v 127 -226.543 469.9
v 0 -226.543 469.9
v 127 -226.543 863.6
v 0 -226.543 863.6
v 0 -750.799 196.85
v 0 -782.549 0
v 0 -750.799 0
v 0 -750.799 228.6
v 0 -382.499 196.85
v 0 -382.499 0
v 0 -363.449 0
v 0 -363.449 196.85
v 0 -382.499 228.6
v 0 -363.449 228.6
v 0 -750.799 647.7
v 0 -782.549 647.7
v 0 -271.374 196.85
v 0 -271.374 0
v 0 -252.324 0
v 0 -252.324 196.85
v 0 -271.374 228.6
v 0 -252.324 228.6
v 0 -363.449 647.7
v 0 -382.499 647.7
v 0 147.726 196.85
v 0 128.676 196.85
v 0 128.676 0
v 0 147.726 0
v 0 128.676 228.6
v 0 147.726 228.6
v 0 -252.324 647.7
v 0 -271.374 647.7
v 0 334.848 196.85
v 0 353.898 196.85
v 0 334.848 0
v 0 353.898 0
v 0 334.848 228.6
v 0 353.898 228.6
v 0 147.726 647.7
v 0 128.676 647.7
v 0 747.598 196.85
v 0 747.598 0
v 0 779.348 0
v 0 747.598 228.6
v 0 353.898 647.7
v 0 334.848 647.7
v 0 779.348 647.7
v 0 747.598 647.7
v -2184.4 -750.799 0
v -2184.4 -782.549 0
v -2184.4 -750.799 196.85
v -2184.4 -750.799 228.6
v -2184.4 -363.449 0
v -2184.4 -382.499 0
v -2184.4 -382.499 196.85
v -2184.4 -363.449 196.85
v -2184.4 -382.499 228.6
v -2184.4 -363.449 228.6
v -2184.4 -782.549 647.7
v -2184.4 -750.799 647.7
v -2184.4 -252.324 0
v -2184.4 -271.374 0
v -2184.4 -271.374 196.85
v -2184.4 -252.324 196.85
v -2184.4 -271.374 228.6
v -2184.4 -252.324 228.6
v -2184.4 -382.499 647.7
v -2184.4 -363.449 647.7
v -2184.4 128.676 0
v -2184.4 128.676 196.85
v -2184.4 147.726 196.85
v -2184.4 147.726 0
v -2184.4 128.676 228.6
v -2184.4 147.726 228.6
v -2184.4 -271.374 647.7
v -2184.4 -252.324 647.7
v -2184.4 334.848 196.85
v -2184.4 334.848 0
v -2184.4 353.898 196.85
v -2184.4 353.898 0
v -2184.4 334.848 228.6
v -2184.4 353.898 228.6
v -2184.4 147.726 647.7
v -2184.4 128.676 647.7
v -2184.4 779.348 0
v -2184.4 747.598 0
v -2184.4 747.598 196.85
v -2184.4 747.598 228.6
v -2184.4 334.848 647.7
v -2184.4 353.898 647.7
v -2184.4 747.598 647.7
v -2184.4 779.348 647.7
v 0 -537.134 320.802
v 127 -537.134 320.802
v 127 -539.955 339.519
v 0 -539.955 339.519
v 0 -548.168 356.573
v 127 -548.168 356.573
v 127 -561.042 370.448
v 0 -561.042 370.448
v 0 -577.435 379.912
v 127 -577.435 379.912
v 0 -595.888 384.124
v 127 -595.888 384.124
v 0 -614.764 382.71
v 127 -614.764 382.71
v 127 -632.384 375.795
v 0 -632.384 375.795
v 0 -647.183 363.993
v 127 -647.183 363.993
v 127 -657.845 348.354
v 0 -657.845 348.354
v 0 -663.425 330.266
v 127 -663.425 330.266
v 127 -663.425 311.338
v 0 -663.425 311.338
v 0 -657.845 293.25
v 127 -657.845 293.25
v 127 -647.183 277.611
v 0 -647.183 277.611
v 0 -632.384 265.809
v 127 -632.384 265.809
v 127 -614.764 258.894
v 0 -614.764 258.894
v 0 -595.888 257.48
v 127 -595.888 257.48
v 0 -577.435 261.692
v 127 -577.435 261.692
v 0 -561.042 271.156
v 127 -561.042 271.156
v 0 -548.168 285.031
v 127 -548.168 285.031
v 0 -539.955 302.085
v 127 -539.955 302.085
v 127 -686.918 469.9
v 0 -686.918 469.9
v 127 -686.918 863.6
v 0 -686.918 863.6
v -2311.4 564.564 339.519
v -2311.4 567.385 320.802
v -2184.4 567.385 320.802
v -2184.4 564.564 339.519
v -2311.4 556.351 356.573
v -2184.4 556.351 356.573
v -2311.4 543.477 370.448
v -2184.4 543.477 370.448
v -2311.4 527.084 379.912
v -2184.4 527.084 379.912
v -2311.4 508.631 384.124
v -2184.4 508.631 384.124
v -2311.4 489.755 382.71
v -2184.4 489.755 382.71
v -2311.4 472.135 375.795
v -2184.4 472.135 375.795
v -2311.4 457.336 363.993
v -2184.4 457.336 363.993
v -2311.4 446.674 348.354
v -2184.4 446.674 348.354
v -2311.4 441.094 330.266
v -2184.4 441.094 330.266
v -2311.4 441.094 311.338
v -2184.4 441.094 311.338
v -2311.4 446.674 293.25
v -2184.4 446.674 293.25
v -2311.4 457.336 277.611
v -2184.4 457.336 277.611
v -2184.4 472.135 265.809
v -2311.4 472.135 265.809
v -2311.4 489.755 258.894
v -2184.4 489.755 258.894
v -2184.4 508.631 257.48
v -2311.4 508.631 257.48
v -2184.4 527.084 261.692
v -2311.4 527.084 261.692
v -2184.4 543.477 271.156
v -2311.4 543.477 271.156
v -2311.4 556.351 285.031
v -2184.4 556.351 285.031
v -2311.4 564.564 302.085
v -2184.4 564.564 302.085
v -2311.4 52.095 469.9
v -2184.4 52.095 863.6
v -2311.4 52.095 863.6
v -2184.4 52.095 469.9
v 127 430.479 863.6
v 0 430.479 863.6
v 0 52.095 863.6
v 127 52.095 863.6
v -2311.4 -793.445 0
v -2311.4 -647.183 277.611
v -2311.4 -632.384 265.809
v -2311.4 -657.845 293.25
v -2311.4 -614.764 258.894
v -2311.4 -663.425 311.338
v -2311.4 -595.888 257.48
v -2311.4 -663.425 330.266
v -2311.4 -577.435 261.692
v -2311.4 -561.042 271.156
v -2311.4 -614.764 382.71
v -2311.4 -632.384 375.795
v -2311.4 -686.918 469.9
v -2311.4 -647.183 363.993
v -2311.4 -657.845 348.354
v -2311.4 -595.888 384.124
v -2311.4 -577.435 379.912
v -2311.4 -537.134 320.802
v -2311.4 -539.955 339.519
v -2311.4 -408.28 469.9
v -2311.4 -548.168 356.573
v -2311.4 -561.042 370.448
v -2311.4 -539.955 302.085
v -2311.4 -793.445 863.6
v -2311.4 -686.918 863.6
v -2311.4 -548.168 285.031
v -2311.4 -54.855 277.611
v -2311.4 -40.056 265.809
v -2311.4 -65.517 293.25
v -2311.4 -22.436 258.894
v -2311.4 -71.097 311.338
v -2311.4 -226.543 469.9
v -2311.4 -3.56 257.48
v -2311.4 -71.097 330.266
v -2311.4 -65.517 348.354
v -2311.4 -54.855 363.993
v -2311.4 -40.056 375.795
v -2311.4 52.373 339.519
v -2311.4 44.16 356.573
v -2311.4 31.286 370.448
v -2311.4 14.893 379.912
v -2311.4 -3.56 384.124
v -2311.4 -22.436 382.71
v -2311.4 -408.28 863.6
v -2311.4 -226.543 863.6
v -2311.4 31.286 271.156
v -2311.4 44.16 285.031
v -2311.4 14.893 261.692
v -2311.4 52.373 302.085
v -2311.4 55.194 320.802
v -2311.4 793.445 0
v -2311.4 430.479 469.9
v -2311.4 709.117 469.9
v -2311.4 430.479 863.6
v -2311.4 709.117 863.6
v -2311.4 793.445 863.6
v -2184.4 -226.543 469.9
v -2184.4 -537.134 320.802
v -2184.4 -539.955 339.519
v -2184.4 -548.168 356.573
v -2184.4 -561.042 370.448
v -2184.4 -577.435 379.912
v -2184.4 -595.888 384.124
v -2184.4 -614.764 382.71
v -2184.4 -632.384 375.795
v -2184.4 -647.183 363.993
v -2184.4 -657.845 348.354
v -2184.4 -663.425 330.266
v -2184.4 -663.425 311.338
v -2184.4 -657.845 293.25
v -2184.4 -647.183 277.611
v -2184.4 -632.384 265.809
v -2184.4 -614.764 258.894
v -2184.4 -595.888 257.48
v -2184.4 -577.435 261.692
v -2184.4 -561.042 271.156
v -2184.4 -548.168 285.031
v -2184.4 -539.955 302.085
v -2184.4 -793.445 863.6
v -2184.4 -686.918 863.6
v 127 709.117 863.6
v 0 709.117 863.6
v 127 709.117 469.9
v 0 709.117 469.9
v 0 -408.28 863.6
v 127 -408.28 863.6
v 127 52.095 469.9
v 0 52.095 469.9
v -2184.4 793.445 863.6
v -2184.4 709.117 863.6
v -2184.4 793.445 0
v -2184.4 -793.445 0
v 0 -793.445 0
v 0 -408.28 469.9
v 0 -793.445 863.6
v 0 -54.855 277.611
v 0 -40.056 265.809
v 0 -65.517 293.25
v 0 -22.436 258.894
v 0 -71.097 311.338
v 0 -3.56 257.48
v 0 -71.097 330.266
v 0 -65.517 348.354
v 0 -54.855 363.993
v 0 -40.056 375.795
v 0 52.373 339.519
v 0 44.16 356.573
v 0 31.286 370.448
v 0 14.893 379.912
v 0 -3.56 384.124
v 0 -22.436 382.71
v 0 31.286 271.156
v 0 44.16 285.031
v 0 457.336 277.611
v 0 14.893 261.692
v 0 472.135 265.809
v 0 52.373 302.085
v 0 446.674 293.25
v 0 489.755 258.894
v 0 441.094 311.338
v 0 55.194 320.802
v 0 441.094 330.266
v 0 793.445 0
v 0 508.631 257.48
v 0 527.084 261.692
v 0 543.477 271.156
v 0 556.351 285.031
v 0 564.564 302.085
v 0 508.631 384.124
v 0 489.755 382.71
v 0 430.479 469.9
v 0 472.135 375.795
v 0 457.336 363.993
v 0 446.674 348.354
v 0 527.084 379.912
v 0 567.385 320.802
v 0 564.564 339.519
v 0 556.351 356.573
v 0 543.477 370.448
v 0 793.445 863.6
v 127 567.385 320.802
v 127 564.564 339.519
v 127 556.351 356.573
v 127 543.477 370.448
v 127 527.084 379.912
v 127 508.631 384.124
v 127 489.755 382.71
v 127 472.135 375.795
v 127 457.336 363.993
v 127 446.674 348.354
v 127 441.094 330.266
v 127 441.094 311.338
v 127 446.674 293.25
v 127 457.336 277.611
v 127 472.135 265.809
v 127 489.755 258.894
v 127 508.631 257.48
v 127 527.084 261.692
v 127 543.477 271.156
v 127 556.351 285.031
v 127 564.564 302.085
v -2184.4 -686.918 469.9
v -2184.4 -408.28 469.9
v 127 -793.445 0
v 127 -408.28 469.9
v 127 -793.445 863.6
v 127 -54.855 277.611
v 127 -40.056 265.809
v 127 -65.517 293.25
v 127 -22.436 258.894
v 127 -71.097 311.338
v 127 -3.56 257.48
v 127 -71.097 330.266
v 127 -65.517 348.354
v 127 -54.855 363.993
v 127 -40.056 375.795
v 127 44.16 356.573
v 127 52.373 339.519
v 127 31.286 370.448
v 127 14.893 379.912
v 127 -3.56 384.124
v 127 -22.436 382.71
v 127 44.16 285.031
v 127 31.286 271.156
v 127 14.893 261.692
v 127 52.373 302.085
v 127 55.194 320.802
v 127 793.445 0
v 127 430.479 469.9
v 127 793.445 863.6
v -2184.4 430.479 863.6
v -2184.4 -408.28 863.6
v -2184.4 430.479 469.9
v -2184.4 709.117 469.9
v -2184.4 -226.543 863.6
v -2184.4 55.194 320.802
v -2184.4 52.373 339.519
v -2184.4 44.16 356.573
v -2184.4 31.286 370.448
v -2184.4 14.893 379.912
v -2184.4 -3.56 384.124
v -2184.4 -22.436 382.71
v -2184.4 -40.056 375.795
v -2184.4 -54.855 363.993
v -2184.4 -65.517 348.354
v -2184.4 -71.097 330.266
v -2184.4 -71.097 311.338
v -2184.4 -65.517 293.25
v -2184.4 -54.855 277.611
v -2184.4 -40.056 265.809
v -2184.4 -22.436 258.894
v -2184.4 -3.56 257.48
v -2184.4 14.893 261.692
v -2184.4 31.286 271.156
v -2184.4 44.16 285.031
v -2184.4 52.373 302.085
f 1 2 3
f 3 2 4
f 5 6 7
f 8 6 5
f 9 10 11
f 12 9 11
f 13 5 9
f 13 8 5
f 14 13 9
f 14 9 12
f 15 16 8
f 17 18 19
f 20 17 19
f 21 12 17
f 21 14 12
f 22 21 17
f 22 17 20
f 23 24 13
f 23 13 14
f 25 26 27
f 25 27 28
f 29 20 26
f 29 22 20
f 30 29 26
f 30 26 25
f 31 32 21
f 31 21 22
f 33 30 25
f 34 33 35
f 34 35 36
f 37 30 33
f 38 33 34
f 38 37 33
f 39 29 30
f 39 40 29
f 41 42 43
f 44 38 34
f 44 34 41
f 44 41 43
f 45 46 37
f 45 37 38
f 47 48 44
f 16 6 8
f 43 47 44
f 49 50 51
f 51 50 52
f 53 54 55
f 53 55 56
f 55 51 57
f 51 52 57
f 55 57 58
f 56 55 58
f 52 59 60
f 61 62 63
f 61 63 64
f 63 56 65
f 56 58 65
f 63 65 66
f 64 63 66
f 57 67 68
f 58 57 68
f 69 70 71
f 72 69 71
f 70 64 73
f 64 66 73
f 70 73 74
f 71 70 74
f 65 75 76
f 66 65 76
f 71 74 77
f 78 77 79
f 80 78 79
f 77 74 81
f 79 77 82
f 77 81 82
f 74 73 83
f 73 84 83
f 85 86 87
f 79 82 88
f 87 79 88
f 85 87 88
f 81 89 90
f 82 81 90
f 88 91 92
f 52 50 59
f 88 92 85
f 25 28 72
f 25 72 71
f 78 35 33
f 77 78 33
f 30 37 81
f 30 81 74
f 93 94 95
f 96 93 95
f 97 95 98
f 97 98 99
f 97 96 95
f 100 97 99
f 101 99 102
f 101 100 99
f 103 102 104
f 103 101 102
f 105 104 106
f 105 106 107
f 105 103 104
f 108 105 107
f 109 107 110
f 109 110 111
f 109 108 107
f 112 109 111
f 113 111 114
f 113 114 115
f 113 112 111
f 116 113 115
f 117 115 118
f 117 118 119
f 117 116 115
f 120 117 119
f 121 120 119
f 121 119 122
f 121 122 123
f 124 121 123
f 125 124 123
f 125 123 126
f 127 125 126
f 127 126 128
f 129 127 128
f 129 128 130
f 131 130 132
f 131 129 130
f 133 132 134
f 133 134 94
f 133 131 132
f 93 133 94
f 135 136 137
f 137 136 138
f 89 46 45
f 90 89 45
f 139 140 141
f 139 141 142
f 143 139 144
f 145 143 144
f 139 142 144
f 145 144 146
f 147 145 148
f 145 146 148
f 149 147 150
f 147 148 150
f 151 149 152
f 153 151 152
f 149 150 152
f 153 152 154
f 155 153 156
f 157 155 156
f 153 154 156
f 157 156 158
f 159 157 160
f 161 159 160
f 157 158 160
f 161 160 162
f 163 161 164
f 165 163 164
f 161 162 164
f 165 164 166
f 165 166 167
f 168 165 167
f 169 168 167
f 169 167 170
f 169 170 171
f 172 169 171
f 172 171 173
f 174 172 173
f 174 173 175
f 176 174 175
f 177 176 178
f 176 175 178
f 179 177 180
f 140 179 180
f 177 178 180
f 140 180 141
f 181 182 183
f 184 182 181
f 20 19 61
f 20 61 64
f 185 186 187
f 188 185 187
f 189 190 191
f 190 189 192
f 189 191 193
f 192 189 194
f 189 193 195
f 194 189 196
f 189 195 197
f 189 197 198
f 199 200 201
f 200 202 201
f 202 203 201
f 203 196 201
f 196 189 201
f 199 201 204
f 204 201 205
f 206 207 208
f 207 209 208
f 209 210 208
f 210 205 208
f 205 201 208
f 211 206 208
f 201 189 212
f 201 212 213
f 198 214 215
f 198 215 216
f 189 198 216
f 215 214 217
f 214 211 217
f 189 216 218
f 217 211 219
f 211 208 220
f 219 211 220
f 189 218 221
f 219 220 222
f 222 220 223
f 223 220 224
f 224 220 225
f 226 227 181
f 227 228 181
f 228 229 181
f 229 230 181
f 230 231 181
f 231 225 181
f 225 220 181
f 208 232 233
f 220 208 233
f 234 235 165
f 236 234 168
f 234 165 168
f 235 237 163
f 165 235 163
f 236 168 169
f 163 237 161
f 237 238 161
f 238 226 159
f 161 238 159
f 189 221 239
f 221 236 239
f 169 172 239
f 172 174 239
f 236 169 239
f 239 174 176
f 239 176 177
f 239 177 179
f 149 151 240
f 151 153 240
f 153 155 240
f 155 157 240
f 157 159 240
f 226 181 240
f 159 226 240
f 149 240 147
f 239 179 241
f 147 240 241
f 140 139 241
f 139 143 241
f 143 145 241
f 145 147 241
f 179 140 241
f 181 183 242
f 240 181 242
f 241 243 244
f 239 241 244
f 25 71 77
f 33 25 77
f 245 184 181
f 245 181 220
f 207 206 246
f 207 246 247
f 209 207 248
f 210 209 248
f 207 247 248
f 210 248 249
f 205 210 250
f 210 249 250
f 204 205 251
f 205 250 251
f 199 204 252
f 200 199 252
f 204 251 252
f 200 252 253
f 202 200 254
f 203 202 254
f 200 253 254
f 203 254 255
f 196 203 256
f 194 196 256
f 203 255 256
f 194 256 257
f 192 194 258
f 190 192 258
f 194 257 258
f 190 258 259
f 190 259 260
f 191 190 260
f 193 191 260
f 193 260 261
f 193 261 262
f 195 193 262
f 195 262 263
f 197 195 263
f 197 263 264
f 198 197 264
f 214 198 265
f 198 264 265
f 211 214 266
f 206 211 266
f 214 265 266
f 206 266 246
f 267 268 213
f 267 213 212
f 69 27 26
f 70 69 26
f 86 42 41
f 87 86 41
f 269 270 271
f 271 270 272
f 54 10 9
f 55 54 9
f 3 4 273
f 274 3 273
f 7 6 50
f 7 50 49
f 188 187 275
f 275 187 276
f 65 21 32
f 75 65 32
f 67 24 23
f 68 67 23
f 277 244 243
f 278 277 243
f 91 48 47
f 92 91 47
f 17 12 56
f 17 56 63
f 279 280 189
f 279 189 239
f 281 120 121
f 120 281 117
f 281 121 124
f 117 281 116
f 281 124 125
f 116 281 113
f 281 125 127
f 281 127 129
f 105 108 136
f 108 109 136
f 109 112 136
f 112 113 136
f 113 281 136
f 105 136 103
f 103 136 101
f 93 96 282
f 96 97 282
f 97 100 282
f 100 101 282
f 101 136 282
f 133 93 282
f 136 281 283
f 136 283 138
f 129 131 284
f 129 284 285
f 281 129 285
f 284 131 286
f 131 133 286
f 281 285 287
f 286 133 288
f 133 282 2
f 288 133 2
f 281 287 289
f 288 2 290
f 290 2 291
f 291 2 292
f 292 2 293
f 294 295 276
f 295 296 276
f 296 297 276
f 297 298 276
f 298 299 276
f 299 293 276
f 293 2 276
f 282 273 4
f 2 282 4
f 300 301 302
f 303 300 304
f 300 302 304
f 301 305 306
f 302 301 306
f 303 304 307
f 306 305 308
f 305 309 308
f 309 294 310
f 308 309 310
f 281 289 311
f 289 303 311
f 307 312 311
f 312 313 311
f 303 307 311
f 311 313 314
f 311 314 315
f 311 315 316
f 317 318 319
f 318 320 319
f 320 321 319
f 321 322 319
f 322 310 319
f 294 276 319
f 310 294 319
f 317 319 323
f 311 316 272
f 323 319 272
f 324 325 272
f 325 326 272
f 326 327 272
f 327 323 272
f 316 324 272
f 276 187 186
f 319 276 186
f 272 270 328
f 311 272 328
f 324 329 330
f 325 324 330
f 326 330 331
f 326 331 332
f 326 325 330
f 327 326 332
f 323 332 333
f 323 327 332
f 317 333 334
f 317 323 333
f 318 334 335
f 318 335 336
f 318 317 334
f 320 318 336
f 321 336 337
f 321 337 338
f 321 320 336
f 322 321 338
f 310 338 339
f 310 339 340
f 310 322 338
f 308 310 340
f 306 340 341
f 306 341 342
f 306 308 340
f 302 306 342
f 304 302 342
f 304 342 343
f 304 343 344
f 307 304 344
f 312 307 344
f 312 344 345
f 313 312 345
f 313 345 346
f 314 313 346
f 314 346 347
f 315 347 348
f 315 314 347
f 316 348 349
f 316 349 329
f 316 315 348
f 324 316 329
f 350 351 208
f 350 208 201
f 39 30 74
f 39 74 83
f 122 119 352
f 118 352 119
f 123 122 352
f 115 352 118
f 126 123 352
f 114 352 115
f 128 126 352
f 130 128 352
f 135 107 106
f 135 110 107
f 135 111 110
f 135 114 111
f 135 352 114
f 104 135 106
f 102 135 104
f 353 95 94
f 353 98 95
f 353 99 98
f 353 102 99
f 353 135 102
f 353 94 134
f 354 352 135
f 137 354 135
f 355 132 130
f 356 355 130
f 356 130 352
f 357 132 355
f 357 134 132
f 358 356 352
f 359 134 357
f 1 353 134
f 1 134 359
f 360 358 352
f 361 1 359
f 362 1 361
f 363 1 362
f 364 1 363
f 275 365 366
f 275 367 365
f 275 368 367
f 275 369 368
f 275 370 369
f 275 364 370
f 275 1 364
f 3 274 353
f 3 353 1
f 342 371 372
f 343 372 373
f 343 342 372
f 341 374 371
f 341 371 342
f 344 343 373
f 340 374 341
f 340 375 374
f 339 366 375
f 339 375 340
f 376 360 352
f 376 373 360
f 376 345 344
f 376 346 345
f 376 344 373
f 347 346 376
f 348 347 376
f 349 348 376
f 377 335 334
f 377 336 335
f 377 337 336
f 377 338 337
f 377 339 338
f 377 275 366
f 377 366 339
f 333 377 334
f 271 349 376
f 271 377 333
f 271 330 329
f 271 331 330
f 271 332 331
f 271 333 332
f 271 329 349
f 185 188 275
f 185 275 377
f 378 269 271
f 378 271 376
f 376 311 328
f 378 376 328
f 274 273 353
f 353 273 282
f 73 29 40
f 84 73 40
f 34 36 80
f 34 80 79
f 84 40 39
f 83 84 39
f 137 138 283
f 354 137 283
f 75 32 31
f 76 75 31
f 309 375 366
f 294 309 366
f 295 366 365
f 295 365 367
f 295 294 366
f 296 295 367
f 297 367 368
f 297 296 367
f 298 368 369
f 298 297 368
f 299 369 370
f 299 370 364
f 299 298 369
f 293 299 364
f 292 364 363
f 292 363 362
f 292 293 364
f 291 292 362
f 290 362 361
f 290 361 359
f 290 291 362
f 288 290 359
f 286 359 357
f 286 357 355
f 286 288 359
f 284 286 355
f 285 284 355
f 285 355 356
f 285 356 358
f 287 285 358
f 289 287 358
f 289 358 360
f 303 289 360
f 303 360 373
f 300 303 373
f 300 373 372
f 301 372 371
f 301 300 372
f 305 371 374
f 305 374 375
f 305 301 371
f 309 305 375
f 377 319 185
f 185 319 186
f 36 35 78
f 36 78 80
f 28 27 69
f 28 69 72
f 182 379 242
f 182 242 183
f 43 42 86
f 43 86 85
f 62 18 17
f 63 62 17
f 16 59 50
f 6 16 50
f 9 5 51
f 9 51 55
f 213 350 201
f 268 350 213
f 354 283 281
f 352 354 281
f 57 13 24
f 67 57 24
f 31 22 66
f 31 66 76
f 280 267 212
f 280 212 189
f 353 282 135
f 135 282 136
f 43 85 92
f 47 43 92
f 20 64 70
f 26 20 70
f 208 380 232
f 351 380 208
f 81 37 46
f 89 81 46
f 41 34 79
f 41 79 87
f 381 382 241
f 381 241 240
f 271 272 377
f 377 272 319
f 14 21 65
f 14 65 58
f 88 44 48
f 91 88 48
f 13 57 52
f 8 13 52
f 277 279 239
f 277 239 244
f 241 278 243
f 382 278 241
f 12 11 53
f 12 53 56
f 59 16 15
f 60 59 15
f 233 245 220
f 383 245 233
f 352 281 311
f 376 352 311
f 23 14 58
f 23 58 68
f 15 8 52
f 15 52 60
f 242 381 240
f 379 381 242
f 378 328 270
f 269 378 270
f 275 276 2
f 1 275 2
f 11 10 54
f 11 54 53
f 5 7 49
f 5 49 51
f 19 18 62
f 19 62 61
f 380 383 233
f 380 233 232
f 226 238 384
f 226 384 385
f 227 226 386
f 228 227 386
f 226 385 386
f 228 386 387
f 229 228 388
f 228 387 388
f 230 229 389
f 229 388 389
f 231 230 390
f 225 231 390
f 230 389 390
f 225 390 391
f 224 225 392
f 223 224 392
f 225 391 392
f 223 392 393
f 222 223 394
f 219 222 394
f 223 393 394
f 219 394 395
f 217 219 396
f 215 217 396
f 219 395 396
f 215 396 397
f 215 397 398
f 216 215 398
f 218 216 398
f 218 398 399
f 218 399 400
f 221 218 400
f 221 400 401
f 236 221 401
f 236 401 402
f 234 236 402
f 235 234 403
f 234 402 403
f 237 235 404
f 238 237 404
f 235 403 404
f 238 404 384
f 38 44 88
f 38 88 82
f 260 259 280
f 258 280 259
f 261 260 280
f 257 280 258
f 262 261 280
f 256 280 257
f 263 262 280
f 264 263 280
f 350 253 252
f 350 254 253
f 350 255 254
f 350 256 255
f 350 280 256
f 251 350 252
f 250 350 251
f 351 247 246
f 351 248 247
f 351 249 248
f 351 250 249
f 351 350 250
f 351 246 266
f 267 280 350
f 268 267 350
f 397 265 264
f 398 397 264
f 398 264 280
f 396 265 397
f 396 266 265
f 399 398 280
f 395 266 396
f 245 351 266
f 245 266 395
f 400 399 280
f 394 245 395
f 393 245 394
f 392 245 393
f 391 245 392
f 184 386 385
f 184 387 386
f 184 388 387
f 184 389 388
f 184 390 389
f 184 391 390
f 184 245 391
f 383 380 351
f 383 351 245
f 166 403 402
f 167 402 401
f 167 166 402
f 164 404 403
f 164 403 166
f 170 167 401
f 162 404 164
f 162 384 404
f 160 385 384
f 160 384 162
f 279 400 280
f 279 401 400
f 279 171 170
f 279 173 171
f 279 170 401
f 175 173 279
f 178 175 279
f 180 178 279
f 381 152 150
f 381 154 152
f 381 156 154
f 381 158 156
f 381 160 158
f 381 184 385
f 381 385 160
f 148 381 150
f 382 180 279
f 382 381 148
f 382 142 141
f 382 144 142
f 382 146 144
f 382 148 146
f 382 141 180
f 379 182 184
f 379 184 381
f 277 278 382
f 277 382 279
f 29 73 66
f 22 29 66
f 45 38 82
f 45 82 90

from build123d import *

# Parameters (mm, degrees)
F0_R     = 63.5
F1_DEPTH = 127
F2_W     = 31.75
F2_H     = 419.1
F2_H_2   = 31.75
F2_W_2   = 368.3
F2_H_3   = 196.85
F2_W_3   = 19.05
F2_W_4   = 92.075
F2_W_5   = 381
F2_W_6   = 187.1218
F2_W_7   = 393.7
F3_DEPTH = 2184.4


with BuildPart() as f1:
    # F0 (on Right) → F1 (new body)
    with BuildSketch(Plane.YZ):
        Polygon((-793.4452, 863.6), (-793.4452, 0), (793.4452, 0), (793.4452, 863.6), (709.1172, 863.6), (709.1172, 469.9), (430.4792, 469.9), (430.4792, 863.6), (52.0954, 863.6), (52.0954, 469.9), (-226.5426, 469.9), (-226.5426, 863.6), (-408.2796, 863.6), (-408.2796, 469.9), (-686.9176, 469.9), (-686.9176, 863.6), align=None)
        with Locations((-600.6338, 320.802)):
            Circle(F0_R, mode=Mode.SUBTRACT)
        with Locations((-8.3058, 320.802)):
            Circle(F0_R, mode=Mode.SUBTRACT)
        with Locations((503.8852, 320.802)):
            Circle(F0_R, mode=Mode.SUBTRACT)
    extrude(amount=F1_DEPTH)


with BuildPart() as f3:
    # F2 (on face) → F3 (new body)
    with BuildSketch(Plane.YZ):
        with Locations((-766.6736, 438.15)):
            Rectangle(F2_W, F2_H)
        with Locations((-766.6736, 212.725)):
            Rectangle(F2_W, F2_H_2)
        with Locations((-566.6486, 212.725)):
            Rectangle(F2_W_2, F2_H_2)
        with Locations((-766.6736, 98.425)):
            Rectangle(F2_W, F2_H_3)
        with Locations((-372.9736, 212.725)):
            Rectangle(F2_W_3, F2_H_2)
        with Locations((-372.9736, 438.15)):
            Rectangle(F2_W_3, F2_H)
        with Locations((-372.9736, 98.425)):
            Rectangle(F2_W_3, F2_H_3)
        with Locations((-317.4111, 212.725)):
            Rectangle(F2_W_4, F2_H_2)
        with Locations((-261.8486, 212.725)):
            Rectangle(F2_W_3, F2_H_2)
        with Locations((-261.8486, 438.15)):
            Rectangle(F2_W_3, F2_H)
        with Locations((-261.8486, 98.425)):
            Rectangle(F2_W_3, F2_H_3)
        with Locations((-61.8236, 212.725)):
            Rectangle(F2_W_5, F2_H_2)
        with Locations((138.2014, 212.725)):
            Rectangle(F2_W_3, F2_H_2)
        with Locations((138.2014, 438.15)):
            Rectangle(F2_W_3, F2_H)
        with Locations((138.2014, 98.425)):
            Rectangle(F2_W_3, F2_H_3)
        with Locations((241.2873, 212.725)):
            Rectangle(F2_W_6, F2_H_2)
        with Locations((344.3732, 212.725)):
            Rectangle(F2_W_3, F2_H_2)
        with Locations((344.3732, 438.15)):
            Rectangle(F2_W_3, F2_H)
        with Locations((344.3732, 98.425)):
            Rectangle(F2_W_3, F2_H_3)
        with Locations((550.7482, 212.725)):
            Rectangle(F2_W_7, F2_H_2)
        with Locations((763.4732, 212.725)):
            Rectangle(F2_W, F2_H_2)
        with Locations((763.4732, 438.15)):
            Rectangle(F2_W, F2_H)
        with Locations((763.4732, 98.425)):
            Rectangle(F2_W, F2_H_3)
    extrude(amount=-F3_DEPTH)


with BuildPart() as f5_1:
    # F5: instance of F1
    add(f1.part.mirror(Plane(origin=(-1092.2, -14.2171552654, 286.8559039669), x_dir=(0, 1, 0), z_dir=(1, 0, 0))))


solid = Compound([f1.part, f3.part, f5_1.part])
